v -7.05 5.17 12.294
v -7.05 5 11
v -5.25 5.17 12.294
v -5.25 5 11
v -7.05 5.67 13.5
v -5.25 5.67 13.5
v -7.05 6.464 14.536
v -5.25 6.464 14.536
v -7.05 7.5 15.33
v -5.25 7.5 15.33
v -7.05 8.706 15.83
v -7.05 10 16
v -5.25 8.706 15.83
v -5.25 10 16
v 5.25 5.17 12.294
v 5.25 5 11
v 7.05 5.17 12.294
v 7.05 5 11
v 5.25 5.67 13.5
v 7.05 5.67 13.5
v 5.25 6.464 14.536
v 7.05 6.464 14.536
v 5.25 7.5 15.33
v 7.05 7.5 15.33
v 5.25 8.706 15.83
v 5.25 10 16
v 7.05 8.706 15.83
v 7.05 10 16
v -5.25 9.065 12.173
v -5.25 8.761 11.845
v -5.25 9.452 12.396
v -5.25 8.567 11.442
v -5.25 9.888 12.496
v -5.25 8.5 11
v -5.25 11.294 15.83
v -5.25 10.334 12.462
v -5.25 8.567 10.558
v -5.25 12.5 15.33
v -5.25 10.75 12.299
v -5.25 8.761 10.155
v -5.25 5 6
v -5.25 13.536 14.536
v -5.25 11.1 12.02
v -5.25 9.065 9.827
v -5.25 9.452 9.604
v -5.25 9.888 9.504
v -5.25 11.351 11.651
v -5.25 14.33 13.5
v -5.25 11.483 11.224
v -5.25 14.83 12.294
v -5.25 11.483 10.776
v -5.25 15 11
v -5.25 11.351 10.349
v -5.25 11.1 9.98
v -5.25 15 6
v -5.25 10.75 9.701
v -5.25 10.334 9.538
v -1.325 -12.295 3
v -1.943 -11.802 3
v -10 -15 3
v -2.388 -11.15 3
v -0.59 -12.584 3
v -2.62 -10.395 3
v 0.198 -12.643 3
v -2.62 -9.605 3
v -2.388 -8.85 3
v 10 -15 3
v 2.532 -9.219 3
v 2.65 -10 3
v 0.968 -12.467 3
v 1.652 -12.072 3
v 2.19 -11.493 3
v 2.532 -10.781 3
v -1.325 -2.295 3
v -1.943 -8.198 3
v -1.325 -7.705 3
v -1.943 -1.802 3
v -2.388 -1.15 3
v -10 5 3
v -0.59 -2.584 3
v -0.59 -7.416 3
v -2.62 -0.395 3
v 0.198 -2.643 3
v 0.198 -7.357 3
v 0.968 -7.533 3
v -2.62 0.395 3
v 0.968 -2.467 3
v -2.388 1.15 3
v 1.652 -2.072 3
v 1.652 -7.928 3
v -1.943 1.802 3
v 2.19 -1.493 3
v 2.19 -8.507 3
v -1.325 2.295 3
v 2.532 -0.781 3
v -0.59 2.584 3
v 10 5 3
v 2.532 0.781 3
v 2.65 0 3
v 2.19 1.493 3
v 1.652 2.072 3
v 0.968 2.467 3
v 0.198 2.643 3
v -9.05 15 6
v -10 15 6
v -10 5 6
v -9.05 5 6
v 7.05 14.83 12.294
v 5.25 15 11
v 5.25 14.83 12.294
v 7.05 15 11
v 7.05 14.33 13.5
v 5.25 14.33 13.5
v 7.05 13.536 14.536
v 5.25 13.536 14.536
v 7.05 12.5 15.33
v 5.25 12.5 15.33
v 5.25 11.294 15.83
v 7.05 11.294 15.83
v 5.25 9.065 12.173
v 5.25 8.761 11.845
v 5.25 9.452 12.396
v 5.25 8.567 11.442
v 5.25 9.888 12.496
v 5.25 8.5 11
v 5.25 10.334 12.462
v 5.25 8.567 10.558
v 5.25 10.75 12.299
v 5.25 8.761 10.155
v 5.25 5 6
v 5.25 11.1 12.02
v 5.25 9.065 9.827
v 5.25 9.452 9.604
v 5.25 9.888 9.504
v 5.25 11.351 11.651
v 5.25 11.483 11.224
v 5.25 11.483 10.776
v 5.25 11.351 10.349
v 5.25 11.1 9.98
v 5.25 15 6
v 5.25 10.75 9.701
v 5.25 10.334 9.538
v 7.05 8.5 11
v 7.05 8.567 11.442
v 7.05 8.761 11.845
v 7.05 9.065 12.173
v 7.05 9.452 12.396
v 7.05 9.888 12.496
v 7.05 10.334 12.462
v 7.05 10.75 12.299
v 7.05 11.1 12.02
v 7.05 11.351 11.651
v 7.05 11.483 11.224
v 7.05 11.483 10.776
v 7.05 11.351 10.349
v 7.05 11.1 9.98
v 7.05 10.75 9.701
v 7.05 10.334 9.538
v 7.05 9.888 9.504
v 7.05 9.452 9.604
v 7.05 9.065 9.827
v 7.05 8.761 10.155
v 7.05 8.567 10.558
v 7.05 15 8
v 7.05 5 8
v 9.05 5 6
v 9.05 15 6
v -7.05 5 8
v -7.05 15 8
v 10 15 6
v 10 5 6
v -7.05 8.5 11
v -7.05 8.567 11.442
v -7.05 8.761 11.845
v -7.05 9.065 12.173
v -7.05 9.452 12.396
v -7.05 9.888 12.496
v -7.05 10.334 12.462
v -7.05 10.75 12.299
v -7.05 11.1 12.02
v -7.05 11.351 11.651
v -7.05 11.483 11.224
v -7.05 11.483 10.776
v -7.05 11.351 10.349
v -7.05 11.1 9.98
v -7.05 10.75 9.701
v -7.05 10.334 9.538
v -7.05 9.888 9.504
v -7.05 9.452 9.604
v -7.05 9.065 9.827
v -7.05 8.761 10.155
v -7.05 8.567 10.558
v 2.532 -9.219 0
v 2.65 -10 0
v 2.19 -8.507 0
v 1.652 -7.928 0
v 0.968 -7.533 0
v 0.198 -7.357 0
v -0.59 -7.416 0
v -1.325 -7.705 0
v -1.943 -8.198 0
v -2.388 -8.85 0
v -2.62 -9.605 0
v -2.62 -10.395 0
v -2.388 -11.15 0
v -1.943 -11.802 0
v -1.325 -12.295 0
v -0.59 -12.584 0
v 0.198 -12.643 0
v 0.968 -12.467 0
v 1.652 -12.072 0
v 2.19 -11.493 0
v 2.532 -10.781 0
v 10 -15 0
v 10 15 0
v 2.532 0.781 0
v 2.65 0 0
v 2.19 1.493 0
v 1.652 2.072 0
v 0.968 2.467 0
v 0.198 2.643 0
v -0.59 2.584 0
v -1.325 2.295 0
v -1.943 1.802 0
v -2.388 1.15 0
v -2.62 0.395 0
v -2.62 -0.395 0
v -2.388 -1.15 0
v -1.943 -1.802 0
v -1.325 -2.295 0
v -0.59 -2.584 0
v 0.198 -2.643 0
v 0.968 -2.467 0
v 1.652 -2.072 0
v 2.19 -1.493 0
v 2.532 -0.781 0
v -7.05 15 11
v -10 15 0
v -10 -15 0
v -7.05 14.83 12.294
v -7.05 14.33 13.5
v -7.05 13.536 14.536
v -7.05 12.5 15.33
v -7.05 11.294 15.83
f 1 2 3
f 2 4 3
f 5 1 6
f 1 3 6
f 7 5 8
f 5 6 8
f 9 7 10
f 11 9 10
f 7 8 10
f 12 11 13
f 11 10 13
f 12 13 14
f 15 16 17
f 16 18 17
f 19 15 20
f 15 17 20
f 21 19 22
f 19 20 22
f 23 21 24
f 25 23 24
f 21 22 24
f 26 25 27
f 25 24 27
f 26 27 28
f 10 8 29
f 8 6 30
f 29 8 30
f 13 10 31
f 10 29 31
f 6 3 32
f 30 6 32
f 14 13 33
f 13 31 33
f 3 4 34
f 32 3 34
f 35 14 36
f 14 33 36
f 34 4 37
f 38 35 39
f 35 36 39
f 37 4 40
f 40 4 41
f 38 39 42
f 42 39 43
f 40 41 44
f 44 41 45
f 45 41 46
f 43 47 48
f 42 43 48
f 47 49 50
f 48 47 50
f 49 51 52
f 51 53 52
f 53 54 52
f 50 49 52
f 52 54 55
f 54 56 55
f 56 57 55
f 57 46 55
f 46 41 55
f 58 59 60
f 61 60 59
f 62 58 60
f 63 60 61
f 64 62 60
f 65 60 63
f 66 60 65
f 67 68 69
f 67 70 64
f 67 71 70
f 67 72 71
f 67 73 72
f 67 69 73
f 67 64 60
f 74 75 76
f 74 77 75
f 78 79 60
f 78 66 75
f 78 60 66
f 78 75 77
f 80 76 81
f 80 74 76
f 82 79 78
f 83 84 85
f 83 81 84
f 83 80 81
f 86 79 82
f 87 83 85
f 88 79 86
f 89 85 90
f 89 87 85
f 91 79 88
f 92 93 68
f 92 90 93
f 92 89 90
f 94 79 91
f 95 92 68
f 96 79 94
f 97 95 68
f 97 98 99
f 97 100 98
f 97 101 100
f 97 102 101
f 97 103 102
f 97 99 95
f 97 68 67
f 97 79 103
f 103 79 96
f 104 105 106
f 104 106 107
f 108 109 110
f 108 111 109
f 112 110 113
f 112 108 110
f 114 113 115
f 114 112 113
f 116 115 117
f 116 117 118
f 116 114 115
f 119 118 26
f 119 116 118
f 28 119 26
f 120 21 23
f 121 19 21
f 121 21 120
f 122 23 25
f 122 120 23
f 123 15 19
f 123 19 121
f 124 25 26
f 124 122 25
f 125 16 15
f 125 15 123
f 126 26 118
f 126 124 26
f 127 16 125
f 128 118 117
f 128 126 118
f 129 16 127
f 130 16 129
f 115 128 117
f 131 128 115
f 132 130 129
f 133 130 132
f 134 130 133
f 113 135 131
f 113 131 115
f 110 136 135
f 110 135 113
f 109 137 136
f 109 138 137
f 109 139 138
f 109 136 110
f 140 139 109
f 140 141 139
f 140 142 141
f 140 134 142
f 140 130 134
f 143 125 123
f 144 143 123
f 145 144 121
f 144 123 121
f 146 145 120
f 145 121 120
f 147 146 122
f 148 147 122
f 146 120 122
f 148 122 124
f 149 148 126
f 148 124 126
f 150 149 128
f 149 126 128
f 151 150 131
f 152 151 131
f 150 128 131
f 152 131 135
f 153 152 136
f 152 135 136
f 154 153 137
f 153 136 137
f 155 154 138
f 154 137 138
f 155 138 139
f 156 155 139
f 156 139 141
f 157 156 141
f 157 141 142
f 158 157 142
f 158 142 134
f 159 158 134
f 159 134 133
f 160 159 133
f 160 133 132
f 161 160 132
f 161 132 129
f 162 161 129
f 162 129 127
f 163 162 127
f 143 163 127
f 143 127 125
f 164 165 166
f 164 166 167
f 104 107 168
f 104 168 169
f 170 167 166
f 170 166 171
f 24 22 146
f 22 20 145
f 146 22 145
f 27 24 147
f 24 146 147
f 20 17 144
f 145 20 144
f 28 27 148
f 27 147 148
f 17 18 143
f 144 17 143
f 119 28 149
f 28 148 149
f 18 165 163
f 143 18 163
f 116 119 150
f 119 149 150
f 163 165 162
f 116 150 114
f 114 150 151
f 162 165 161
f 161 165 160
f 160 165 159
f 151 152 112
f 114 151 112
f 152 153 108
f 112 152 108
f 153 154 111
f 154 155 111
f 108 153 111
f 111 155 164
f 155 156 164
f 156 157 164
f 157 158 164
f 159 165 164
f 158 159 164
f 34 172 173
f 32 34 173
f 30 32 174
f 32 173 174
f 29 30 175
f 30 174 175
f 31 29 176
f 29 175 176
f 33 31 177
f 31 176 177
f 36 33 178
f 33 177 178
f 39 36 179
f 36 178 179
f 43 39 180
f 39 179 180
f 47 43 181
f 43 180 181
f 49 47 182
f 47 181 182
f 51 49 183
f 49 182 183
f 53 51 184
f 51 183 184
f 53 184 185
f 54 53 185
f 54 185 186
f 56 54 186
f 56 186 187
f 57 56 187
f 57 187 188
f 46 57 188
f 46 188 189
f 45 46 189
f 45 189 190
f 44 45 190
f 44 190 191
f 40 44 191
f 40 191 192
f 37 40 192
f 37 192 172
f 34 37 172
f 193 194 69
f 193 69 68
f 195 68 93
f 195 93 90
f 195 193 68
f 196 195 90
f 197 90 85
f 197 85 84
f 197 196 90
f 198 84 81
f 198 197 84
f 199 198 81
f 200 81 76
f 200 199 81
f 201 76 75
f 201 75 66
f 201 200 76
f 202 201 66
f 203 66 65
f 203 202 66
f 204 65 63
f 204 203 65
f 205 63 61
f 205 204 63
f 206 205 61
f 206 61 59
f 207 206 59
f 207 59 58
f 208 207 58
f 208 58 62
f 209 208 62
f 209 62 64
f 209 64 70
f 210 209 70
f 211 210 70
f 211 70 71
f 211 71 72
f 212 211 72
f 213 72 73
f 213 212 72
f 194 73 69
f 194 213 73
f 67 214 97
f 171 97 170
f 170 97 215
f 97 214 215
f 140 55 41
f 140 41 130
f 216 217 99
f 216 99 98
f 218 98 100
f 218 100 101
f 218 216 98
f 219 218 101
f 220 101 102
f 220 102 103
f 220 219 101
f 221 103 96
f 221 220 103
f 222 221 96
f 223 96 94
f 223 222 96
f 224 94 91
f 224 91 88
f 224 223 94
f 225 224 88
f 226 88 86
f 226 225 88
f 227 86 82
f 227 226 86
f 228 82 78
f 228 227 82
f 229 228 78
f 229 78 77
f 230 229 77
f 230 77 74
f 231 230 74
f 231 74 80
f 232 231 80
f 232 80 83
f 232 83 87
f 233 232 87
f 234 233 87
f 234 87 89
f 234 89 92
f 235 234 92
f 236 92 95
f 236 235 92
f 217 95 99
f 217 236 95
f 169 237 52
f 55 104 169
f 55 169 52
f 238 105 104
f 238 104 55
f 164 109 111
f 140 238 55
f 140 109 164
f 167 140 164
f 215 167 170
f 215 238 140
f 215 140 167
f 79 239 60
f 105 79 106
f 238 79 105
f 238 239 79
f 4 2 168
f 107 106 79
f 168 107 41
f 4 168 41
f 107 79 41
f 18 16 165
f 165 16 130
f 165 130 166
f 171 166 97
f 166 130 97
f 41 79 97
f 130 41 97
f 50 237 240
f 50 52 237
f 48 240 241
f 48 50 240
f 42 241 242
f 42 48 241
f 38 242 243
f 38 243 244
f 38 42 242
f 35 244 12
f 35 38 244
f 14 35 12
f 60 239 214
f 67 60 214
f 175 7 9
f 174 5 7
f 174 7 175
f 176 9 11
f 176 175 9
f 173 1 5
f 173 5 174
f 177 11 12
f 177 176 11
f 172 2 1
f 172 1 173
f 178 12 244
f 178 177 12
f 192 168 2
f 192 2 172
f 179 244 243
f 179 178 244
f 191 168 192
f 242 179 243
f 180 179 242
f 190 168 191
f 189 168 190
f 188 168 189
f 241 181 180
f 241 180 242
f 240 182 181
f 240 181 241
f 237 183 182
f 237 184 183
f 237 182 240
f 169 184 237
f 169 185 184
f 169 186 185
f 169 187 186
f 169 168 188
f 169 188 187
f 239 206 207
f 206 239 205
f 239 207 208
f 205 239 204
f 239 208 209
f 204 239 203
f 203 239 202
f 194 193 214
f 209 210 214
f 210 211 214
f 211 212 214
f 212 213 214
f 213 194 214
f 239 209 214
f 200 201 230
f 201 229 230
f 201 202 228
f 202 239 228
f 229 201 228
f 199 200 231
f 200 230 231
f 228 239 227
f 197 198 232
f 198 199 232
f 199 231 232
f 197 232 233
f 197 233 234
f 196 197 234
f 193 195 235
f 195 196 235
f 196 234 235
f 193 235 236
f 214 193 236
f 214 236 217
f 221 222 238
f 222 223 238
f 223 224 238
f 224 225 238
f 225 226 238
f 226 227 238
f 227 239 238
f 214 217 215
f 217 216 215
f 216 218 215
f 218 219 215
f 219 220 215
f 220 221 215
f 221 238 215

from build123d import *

# Parameters (mm, degrees)
SKETCH1_W           = 20
SKETCH1_H           = 30
SKETCH1_R           = 2.65
BOSS_EXTRUDE1_DEPTH = 3
SKETCH2_W           = 20
SKETCH2_H           = 10
BOSS_EXTRUDE2_DEPTH = 3
SKETCH3_W           = 1.8
SKETCH3_H           = 10
BOSS_EXTRUDE3_DEPTH = 10
FILLET1_R           = 5
CUT_EXTRUDE1_REACH  = 29.78
SKETCH4_R           = 1.5
CHAMFER1_SIZE       = 2


with BuildPart() as part:
    # Sketch1 → Boss-Extrude1 (new body)
    with BuildSketch(Plane.XY):
        Rectangle(SKETCH1_W, SKETCH1_H)
        with Locations((0, -10)):
            Circle(SKETCH1_R, mode=Mode.SUBTRACT)
        Circle(SKETCH1_R, mode=Mode.SUBTRACT)
    extrude(amount=BOSS_EXTRUDE1_DEPTH)

    # Sketch2 → Boss-Extrude2 (add)
    with BuildSketch(Plane.XY.offset(3)):
        with Locations((0, 10)):
            Rectangle(SKETCH2_W, SKETCH2_H)
    extrude(amount=BOSS_EXTRUDE2_DEPTH)

    # Sketch3 → Boss-Extrude3 (add)
    with BuildSketch(Plane.XY.offset(6)):
        with Locations((-6.15, 10)):
            Rectangle(SKETCH3_W, SKETCH3_H)
        with Locations((6.15, 10)):
            Rectangle(SKETCH3_W, SKETCH3_H)
    extrude(amount=BOSS_EXTRUDE3_DEPTH)

    # Fillet1
    fillet1_edges = [part.edges().sort_by_distance(p)[0] for p in [
        (6.15, 5, 16),
        (-6.15, 5, 16),
        (6.15, 15, 16),
        (-6.15, 15, 16),
    ]]
    fillet(fillet1_edges, radius=FILLET1_R - 0.0001)  # a hair under: the kernel refuses the full size

    # Cut-Extrude1: up to this face of the body (flat: up to its plane)
    cut_extrude1_end = Plane(part.part.faces().sort_by_distance((7.05, 10, 10.533268934))[0])
    # Sketch4 → Cut-Extrude1 (cut, up to the picked face)
    with BuildSketch(Plane.ZY.offset(7.05), mode=Mode.PRIVATE) as cut_extrude1_sk1:
        with Locations(Location((11, 10, 0), (0, 0, 270))):
            Circle(SKETCH4_R)
    cut_extrude1_tool1 = split(extrude(cut_extrude1_sk1.sketch, amount=-CUT_EXTRUDE1_REACH, mode=Mode.PRIVATE), bisect_by=cut_extrude1_end, keep=Keep.BOTH, mode=Mode.PRIVATE)
    add(cut_extrude1_tool1.solids().sort_by(Axis((-7.05, 10, 11), (1, 0, 0)))[0], mode=Mode.SUBTRACT)

    # Chamfer1
    chamfer1_edges = [part.edges().sort_by_distance(p)[0] for p in [
        (-7.05, 10, 6),
        (7.05, 10, 6),
    ]]
    chamfer(chamfer1_edges, length=CHAMFER1_SIZE)


solid = part.part
